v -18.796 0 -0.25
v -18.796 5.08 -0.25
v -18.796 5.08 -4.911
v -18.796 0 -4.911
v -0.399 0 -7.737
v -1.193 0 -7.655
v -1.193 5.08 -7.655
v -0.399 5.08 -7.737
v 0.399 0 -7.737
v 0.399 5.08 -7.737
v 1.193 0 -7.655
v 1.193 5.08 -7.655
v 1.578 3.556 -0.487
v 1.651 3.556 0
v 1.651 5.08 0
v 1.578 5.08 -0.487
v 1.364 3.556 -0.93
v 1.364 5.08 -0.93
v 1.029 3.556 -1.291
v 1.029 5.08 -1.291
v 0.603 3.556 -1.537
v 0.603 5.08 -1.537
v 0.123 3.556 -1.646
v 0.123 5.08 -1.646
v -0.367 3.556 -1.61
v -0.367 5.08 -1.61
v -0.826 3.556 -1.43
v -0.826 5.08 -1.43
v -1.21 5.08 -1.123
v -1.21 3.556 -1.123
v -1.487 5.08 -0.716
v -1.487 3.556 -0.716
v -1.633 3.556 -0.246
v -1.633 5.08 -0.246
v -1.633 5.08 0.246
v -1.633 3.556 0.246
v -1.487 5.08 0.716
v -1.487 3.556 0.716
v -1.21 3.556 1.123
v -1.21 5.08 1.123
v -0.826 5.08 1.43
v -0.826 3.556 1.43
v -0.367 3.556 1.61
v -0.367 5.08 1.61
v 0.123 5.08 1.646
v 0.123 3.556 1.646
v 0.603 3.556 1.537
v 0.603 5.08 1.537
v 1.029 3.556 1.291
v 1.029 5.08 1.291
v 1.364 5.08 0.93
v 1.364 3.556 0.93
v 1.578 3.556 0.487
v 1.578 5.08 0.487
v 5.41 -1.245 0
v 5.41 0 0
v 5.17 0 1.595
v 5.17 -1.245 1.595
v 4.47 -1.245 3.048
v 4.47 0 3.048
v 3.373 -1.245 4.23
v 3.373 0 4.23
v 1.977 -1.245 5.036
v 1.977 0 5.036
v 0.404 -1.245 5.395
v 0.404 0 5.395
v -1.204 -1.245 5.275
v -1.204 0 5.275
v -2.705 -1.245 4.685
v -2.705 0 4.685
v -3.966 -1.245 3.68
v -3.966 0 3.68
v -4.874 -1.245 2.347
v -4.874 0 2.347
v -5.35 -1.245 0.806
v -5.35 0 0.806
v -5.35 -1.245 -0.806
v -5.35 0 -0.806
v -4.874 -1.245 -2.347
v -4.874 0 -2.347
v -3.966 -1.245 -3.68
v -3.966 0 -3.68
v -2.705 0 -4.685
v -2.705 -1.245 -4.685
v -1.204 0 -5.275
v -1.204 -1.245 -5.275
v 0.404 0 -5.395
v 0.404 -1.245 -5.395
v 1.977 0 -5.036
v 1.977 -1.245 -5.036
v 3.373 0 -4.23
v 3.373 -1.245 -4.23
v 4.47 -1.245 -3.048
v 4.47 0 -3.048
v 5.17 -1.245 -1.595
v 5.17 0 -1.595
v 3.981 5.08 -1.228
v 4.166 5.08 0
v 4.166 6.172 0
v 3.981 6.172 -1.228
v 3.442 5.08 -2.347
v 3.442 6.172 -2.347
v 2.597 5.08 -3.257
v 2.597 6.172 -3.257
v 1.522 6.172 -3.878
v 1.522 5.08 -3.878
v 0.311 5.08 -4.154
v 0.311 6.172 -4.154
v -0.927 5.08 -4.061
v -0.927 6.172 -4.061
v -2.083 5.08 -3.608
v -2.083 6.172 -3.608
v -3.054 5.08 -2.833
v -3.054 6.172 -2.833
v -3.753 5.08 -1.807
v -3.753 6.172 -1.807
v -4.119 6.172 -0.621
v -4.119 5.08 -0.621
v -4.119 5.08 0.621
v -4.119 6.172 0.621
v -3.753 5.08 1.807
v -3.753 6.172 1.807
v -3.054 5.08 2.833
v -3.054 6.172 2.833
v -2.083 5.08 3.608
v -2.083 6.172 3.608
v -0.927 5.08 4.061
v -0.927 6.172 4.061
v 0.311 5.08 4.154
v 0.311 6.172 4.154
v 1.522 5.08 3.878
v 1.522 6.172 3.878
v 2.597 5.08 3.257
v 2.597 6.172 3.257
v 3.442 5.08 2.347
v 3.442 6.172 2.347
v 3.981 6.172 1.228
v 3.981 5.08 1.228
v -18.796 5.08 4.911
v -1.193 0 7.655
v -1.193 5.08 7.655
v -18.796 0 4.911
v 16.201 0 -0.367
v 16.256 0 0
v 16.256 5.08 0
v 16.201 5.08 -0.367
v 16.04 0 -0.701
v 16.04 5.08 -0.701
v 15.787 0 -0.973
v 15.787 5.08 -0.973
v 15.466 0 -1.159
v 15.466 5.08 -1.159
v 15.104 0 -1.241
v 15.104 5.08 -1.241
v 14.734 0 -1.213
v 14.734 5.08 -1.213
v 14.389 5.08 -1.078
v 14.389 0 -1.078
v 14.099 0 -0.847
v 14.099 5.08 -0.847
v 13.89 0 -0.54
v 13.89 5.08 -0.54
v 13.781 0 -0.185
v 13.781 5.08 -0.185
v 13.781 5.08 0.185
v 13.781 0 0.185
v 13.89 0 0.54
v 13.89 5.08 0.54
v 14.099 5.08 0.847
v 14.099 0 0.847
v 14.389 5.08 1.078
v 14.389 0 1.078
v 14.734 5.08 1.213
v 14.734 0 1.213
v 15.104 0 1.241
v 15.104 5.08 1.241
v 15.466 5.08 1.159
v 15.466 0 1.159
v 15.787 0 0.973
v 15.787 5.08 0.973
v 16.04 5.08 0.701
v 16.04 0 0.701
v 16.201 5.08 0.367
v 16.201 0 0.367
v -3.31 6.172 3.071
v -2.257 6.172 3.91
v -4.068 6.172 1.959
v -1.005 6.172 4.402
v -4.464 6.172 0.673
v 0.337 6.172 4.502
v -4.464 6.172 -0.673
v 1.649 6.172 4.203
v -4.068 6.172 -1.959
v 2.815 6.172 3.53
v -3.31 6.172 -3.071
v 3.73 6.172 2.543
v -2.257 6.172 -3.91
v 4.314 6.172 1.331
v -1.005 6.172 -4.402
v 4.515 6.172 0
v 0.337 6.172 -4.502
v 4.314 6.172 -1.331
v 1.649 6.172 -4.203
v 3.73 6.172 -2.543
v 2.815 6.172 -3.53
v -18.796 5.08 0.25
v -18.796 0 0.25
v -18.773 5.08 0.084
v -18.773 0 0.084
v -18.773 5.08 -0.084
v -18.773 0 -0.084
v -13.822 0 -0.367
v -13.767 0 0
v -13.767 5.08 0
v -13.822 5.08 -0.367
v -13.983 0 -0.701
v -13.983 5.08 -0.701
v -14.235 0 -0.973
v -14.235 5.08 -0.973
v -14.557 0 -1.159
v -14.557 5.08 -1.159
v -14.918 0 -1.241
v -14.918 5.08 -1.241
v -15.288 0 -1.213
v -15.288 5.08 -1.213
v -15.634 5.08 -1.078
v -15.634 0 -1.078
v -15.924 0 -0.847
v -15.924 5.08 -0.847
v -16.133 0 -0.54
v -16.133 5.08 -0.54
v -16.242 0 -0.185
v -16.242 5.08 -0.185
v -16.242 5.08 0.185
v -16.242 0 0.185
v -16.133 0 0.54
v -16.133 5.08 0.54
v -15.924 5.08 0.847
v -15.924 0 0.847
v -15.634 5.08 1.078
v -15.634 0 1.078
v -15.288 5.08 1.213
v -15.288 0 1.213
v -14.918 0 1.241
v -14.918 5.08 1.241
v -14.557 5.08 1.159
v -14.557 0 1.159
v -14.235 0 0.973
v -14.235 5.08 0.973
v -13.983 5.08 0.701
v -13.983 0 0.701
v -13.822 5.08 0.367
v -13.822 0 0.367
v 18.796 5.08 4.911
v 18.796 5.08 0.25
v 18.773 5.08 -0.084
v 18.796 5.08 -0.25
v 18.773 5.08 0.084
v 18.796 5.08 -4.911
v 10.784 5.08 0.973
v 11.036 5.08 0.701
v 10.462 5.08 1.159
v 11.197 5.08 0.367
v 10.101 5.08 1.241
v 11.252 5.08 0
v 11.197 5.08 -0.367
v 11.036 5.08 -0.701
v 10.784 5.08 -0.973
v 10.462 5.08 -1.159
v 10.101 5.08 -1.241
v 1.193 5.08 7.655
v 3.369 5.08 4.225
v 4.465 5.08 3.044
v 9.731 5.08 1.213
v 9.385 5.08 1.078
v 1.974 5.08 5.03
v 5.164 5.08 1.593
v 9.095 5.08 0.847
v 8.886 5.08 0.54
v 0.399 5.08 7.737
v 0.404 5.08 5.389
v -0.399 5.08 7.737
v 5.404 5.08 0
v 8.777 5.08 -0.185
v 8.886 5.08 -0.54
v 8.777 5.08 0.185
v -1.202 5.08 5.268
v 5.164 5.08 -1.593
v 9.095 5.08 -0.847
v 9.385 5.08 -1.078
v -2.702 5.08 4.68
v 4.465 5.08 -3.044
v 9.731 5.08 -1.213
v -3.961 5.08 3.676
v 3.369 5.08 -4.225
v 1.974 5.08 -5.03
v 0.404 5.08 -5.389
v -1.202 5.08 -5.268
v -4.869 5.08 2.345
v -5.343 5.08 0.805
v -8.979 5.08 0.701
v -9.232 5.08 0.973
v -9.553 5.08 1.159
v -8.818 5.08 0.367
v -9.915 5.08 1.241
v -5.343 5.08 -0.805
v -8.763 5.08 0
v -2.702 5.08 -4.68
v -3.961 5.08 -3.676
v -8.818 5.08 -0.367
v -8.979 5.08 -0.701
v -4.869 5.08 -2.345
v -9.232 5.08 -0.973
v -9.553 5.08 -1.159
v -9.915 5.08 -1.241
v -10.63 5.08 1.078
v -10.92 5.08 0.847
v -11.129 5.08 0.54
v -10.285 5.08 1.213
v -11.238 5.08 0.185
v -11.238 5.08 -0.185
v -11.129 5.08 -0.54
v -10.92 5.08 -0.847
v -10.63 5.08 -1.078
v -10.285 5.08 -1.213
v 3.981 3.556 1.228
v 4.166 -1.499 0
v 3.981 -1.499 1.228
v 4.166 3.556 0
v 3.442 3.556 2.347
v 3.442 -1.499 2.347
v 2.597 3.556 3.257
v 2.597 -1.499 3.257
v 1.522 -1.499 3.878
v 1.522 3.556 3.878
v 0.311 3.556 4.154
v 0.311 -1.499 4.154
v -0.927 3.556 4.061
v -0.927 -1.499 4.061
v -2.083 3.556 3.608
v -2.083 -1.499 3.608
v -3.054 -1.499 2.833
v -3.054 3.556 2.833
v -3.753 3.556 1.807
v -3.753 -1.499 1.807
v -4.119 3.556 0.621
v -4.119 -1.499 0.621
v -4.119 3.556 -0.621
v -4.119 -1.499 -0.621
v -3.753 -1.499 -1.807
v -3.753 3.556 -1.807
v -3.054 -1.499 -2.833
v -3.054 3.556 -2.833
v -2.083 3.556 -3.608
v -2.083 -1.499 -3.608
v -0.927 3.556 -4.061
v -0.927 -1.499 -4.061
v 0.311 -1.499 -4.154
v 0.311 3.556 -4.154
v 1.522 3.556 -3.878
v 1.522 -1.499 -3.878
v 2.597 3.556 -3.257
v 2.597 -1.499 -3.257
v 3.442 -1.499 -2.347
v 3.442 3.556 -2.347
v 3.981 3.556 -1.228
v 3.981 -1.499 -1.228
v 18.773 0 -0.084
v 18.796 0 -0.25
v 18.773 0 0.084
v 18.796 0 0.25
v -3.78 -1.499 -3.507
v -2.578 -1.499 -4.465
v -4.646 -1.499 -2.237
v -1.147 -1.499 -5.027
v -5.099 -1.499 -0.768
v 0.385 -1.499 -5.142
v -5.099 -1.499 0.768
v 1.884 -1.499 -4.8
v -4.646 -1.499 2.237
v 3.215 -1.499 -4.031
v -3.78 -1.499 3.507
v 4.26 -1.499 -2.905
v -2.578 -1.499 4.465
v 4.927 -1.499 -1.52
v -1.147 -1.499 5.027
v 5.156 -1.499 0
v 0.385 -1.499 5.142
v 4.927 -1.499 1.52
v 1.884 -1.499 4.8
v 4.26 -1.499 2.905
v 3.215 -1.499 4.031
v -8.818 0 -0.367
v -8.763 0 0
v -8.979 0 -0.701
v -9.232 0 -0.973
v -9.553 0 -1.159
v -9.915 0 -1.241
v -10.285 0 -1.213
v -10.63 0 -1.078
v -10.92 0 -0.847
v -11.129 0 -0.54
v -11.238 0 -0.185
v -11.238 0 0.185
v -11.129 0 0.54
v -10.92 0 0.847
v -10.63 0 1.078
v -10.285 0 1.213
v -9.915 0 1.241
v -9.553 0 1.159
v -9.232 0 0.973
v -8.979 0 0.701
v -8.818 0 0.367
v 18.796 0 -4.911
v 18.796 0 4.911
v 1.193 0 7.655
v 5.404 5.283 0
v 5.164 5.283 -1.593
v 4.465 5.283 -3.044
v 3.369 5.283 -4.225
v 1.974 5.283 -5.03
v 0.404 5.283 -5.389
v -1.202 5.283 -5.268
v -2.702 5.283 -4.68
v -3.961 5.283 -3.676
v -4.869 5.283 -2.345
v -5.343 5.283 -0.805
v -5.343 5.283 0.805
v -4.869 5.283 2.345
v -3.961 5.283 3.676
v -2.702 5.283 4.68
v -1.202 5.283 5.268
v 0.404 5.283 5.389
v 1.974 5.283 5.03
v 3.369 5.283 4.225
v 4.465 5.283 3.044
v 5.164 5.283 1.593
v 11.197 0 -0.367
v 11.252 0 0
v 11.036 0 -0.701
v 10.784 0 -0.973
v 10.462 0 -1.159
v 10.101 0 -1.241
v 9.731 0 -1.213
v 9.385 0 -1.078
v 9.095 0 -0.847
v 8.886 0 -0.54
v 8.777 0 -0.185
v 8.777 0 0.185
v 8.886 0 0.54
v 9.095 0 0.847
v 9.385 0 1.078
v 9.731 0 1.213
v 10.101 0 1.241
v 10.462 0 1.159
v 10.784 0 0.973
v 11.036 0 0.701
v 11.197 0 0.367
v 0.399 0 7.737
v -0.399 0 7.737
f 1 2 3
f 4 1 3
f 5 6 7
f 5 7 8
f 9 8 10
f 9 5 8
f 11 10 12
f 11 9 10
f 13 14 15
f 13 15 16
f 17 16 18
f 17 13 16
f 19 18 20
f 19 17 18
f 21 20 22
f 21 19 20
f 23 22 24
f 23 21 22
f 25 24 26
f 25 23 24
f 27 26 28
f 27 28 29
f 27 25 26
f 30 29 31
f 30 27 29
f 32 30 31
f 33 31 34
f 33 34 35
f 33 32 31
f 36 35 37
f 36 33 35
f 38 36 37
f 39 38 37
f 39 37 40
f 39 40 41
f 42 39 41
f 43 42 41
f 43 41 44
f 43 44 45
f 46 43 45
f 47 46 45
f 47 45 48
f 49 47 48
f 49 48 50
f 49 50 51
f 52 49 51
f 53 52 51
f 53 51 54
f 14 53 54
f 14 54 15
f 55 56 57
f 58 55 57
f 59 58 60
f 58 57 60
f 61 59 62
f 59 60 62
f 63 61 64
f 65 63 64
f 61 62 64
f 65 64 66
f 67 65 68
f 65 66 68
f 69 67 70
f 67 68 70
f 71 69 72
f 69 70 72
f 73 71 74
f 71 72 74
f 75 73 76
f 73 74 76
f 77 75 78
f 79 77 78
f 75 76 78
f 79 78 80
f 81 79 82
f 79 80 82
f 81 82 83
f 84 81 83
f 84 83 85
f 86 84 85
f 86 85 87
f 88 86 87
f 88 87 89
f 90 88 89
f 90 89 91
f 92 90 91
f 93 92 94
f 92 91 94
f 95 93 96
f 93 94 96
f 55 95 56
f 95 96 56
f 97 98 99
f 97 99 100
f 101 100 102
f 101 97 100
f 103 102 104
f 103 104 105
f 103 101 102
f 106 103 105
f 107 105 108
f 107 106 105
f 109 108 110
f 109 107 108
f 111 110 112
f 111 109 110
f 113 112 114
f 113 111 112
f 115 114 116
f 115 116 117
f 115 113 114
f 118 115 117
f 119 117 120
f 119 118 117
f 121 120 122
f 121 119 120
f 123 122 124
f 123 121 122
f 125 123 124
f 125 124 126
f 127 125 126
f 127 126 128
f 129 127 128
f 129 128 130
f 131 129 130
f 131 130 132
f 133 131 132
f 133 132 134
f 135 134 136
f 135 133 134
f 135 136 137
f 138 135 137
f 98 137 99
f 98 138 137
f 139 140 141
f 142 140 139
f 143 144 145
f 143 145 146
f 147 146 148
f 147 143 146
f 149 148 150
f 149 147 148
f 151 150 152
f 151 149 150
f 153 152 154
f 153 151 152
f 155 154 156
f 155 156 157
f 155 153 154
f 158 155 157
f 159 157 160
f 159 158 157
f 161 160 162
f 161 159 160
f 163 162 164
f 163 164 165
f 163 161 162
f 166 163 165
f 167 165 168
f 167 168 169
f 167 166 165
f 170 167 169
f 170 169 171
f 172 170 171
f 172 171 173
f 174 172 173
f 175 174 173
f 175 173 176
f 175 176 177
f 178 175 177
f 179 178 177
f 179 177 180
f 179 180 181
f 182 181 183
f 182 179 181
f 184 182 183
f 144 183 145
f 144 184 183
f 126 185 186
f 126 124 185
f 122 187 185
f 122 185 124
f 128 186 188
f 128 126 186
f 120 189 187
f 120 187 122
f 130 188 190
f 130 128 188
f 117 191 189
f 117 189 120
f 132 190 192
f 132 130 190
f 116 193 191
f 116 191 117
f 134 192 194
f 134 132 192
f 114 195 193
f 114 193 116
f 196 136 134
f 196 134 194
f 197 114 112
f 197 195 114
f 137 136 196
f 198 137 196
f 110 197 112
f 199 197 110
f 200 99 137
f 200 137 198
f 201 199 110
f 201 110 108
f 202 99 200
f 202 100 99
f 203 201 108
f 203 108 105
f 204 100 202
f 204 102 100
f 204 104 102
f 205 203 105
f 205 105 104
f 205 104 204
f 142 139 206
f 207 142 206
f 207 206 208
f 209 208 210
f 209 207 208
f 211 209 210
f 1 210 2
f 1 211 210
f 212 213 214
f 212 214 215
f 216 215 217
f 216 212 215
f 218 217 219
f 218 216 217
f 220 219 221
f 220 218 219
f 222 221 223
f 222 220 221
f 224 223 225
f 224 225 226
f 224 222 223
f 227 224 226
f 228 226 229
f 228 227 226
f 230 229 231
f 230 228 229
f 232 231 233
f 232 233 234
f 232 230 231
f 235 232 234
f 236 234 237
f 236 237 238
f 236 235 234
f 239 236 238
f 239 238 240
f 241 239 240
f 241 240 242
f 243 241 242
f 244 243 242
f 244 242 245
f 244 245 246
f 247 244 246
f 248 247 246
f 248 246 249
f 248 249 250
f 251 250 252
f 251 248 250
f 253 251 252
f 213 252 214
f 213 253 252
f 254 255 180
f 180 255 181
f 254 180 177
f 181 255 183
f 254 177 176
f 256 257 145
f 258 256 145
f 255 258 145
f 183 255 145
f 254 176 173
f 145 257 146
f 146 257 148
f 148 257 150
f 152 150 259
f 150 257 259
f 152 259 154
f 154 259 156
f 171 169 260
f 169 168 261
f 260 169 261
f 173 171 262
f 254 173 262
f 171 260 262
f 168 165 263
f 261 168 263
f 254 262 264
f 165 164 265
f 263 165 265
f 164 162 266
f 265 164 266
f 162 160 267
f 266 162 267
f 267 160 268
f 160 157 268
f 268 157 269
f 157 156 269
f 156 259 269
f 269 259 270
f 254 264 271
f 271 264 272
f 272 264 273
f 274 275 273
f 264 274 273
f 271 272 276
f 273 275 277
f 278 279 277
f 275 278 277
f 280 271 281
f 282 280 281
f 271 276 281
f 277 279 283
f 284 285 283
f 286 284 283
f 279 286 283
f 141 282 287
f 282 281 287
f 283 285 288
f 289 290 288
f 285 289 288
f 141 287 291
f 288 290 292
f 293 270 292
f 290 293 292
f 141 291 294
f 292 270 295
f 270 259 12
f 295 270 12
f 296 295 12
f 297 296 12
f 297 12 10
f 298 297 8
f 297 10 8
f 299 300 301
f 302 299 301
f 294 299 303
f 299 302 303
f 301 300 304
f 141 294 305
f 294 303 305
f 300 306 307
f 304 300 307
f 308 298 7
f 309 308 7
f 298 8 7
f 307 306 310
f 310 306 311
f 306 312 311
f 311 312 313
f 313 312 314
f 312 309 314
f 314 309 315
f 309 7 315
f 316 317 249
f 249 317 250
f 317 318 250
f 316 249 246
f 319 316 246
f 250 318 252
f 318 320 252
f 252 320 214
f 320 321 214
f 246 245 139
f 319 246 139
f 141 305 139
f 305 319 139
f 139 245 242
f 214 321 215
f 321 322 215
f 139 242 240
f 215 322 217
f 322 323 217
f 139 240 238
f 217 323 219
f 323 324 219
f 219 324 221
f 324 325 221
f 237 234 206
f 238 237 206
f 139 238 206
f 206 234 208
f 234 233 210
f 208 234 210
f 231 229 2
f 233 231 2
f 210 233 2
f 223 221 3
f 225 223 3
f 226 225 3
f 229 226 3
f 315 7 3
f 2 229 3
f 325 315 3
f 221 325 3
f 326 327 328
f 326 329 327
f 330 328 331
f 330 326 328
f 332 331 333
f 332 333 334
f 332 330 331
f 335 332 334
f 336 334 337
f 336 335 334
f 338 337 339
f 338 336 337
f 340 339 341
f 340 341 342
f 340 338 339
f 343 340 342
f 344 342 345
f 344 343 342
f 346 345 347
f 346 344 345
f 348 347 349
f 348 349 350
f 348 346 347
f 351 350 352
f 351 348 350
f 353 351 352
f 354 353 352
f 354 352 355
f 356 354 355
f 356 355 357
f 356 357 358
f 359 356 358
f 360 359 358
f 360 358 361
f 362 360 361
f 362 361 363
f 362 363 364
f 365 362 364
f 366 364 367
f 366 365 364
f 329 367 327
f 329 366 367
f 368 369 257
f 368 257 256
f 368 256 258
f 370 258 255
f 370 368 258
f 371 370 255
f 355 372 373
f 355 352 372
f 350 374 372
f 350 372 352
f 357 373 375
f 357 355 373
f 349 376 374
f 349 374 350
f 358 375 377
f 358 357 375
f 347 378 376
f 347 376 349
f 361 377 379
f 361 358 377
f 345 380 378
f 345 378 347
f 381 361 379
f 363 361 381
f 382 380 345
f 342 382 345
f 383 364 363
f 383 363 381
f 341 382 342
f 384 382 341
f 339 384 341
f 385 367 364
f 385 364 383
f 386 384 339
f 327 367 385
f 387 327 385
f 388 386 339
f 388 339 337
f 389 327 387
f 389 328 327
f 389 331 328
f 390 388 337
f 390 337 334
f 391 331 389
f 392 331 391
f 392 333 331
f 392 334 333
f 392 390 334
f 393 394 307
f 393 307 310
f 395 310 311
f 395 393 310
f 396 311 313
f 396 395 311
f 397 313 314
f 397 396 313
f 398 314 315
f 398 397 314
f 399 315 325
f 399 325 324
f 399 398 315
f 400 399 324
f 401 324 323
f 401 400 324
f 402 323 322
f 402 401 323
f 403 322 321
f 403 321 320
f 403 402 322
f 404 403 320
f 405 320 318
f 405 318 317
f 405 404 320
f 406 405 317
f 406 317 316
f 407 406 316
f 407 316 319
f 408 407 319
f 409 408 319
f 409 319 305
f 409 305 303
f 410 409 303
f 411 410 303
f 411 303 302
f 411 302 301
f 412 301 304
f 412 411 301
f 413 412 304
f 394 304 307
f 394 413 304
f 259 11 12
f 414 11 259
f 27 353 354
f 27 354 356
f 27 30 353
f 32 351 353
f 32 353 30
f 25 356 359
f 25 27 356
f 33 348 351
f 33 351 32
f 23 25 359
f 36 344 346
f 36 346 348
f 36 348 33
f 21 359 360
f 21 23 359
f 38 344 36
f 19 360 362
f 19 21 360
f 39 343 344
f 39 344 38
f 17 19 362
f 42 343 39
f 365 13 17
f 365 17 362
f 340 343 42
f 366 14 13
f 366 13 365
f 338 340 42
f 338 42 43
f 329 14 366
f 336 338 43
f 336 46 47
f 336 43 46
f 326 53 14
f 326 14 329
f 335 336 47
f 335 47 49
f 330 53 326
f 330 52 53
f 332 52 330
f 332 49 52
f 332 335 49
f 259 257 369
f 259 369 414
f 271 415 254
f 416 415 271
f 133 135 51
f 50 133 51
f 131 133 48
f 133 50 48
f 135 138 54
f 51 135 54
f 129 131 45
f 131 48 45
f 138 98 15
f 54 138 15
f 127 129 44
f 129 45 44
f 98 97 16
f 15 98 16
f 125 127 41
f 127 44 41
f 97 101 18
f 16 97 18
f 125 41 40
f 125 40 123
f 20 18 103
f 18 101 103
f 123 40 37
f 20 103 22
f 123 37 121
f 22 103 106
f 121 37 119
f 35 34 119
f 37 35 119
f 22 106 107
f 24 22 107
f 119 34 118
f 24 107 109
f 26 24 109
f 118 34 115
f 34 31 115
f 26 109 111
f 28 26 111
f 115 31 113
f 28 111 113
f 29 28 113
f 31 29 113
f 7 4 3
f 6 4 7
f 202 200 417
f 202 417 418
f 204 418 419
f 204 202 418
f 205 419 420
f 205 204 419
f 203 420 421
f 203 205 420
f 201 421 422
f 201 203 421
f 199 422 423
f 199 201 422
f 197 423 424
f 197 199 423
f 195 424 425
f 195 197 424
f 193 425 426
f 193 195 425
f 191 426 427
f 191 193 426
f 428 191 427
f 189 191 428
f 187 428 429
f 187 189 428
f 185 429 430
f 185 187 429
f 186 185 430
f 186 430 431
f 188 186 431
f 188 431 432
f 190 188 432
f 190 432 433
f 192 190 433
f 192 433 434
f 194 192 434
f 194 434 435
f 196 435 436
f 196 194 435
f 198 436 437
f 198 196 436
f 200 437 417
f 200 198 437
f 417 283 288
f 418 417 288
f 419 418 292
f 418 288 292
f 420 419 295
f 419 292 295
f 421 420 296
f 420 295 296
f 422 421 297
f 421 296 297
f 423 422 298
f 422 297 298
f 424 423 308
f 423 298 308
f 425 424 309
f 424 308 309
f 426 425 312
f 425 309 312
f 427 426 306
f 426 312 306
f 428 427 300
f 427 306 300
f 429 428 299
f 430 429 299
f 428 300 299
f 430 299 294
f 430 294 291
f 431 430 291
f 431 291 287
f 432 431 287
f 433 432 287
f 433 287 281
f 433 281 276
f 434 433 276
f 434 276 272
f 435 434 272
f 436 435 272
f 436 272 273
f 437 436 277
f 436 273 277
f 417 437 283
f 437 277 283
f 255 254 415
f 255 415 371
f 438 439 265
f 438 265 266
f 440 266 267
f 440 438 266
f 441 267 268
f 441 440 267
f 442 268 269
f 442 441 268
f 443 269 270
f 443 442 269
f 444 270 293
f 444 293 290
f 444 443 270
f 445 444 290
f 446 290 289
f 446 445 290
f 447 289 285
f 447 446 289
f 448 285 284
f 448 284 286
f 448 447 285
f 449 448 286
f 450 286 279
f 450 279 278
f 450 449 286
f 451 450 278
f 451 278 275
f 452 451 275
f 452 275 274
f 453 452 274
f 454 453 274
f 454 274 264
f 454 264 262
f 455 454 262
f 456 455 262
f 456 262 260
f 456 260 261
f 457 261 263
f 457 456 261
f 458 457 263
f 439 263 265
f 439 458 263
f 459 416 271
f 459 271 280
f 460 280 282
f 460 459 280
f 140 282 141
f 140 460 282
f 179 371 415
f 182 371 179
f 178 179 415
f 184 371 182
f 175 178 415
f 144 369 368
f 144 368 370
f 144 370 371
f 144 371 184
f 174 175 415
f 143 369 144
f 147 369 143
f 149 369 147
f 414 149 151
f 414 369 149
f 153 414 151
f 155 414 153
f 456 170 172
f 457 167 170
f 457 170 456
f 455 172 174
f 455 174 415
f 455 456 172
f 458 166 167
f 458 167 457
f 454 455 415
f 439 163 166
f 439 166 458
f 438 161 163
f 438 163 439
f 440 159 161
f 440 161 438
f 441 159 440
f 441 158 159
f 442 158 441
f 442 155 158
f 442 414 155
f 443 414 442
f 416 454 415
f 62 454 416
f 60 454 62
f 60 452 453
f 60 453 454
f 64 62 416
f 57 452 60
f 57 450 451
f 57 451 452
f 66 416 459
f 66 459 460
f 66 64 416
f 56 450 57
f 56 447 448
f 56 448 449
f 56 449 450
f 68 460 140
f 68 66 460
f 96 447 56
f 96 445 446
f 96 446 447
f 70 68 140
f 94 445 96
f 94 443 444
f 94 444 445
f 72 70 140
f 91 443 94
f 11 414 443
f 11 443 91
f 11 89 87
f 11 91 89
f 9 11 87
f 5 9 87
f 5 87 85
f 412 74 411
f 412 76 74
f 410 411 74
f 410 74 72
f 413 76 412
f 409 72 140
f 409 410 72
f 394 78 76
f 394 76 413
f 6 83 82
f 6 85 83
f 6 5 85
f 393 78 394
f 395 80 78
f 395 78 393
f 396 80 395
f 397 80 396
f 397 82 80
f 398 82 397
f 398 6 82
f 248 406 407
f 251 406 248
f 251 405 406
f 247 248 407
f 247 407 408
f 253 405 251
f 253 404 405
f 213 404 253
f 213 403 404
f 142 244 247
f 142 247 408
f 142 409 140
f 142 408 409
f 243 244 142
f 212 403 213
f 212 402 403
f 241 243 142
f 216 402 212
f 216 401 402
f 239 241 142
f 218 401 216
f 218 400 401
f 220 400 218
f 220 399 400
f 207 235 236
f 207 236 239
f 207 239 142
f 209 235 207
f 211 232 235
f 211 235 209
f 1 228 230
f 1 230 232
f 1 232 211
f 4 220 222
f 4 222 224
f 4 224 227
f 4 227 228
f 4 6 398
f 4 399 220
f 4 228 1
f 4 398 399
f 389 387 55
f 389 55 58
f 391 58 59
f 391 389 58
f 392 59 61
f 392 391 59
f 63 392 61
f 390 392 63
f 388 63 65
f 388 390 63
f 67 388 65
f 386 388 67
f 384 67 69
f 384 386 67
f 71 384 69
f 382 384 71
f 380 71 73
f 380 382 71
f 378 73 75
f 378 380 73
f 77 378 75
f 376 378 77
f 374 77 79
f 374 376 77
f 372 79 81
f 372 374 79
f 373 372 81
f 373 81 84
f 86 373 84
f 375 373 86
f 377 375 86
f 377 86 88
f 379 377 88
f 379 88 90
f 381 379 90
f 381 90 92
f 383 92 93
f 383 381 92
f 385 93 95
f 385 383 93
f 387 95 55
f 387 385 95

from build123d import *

# Parameters (mm, degrees)
SKETCH1_R           = 1.651
SKETCH1_R_2         = 1.2446
BOSS_EXTRUDE1_DEPTH = 5.08
SKETCH2_R           = 5.40385
SKETCH2_R_2         = 4.1656
BOSS_EXTRUDE2_DEPTH = 1.0922
CHAMFER1_SIZE       = 0.889
SKETCH4_R           = 5.4102
SKETCH4_R_2         = 4.1656
BOSS_EXTRUDE3_DEPTH = 1.4986
CHAMFER2_SIZE       = 0.254
SKETCH5_W           = 15.127715844
SKETCH5_H           = 12.166577881
CUT_EXTRUDE1_DEPTH  = 7.5786
SKETCH6_R           = 4.1656
CUT_EXTRUDE2_DEPTH  = 3.556


with BuildPart() as part:
    # Sketch1 → Boss-Extrude1 (new body)
    with BuildSketch(Plane(origin=(0, 0, 0), x_dir=(1, 0, 0), z_dir=(0, 1, 0))):
        with BuildLine():
            Line((-30.503852792, 3.086942476), (-1.192854484, 7.654613457))
            ThreePointArc((-1.192854484, 7.654613457), (0, 7.747), (1.192854484, 7.654613457))
            Line((1.192854484, 7.654613457), (30.503852792, 3.086942476))
            ThreePointArc((30.503852792, 3.086942476), (33.147, 0), (30.503852792, -3.086942476))
            Line((30.503852792, -3.086942476), (1.192854484, -7.654613457))
            ThreePointArc((1.192854484, -7.654613457), (0, -7.747), (-1.192854484, -7.654613457))
            Line((-1.192854484, -7.654613457), (-30.503852792, -3.086942476))
            ThreePointArc((-30.503852792, -3.086942476), (-33.147, 0), (-30.503852792, 3.086942476))
        make_face()
        Circle(SKETCH1_R, mode=Mode.SUBTRACT)
        with Locations((-10.0076, 0)):
            Circle(SKETCH1_R_2, mode=Mode.SUBTRACT)
        with Locations((-15.0114, 0)):
            Circle(SKETCH1_R_2, mode=Mode.SUBTRACT)
        with Locations((-20.0152, 0)):
            Circle(SKETCH1_R_2, mode=Mode.SUBTRACT)
        with Locations((-25.019, 0)):
            Circle(SKETCH1_R_2, mode=Mode.SUBTRACT)
        with Locations((-30.0228, 0)):
            Circle(SKETCH1_R_2, mode=Mode.SUBTRACT)
        with Locations((30.0228, 0)):
            Circle(SKETCH1_R_2, mode=Mode.SUBTRACT)
        with Locations((25.019, 0)):
            Circle(SKETCH1_R_2, mode=Mode.SUBTRACT)
        with Locations((20.0152, 0)):
            Circle(SKETCH1_R_2, mode=Mode.SUBTRACT)
        with Locations((15.0114, 0)):
            Circle(SKETCH1_R_2, mode=Mode.SUBTRACT)
        with Locations((10.0076, 0)):
            Circle(SKETCH1_R_2, mode=Mode.SUBTRACT)
    extrude(amount=BOSS_EXTRUDE1_DEPTH)

    # Sketch2 → Boss-Extrude2 (add)
    with BuildSketch(Plane(origin=(0, 5.08, 0), x_dir=(1, 0, 0), z_dir=(0, 1, 0))):
        Circle(SKETCH2_R)
        Circle(SKETCH2_R_2, mode=Mode.SUBTRACT)
    extrude(amount=BOSS_EXTRUDE2_DEPTH)

    # Chamfer1
    chamfer1_edges = [part.edges().sort_by_distance(p)[0] for p in [
        (-5.40385, 6.1722, 0),
    ]]
    chamfer(chamfer1_edges, length=CHAMFER1_SIZE)

    # Sketch4 → Boss-Extrude3 (add)
    with BuildSketch(Plane.XZ):
        Circle(SKETCH4_R)
        Circle(SKETCH4_R_2, mode=Mode.SUBTRACT)
    extrude(amount=BOSS_EXTRUDE3_DEPTH)

    # Chamfer2
    chamfer2_edges = [part.edges().sort_by_distance(p)[0] for p in [
        (-5.4102, -1.4986, 0),
    ]]
    chamfer(chamfer2_edges, length=CHAMFER2_SIZE)

    # Sketch5 → Cut-Extrude1 (cut, through all)
    with BuildSketch(Plane(origin=(0, 5.08, 0), x_dir=(1, 0, 0), z_dir=(0, 1, 0))):
        with Locations((-26.359857922, -0.574807794)):
            Rectangle(SKETCH5_W, SKETCH5_H)
        with Locations((26.359857922, -0.574807794)):
            Rectangle(SKETCH5_W, SKETCH5_H)
    extrude(amount=-CUT_EXTRUDE1_DEPTH, mode=Mode.SUBTRACT)

    # Sketch6 → Cut-Extrude2 (cut)
    with BuildSketch(Plane.XZ):
        Circle(SKETCH6_R)
    extrude(amount=-CUT_EXTRUDE2_DEPTH, mode=Mode.SUBTRACT)


solid = part.part
